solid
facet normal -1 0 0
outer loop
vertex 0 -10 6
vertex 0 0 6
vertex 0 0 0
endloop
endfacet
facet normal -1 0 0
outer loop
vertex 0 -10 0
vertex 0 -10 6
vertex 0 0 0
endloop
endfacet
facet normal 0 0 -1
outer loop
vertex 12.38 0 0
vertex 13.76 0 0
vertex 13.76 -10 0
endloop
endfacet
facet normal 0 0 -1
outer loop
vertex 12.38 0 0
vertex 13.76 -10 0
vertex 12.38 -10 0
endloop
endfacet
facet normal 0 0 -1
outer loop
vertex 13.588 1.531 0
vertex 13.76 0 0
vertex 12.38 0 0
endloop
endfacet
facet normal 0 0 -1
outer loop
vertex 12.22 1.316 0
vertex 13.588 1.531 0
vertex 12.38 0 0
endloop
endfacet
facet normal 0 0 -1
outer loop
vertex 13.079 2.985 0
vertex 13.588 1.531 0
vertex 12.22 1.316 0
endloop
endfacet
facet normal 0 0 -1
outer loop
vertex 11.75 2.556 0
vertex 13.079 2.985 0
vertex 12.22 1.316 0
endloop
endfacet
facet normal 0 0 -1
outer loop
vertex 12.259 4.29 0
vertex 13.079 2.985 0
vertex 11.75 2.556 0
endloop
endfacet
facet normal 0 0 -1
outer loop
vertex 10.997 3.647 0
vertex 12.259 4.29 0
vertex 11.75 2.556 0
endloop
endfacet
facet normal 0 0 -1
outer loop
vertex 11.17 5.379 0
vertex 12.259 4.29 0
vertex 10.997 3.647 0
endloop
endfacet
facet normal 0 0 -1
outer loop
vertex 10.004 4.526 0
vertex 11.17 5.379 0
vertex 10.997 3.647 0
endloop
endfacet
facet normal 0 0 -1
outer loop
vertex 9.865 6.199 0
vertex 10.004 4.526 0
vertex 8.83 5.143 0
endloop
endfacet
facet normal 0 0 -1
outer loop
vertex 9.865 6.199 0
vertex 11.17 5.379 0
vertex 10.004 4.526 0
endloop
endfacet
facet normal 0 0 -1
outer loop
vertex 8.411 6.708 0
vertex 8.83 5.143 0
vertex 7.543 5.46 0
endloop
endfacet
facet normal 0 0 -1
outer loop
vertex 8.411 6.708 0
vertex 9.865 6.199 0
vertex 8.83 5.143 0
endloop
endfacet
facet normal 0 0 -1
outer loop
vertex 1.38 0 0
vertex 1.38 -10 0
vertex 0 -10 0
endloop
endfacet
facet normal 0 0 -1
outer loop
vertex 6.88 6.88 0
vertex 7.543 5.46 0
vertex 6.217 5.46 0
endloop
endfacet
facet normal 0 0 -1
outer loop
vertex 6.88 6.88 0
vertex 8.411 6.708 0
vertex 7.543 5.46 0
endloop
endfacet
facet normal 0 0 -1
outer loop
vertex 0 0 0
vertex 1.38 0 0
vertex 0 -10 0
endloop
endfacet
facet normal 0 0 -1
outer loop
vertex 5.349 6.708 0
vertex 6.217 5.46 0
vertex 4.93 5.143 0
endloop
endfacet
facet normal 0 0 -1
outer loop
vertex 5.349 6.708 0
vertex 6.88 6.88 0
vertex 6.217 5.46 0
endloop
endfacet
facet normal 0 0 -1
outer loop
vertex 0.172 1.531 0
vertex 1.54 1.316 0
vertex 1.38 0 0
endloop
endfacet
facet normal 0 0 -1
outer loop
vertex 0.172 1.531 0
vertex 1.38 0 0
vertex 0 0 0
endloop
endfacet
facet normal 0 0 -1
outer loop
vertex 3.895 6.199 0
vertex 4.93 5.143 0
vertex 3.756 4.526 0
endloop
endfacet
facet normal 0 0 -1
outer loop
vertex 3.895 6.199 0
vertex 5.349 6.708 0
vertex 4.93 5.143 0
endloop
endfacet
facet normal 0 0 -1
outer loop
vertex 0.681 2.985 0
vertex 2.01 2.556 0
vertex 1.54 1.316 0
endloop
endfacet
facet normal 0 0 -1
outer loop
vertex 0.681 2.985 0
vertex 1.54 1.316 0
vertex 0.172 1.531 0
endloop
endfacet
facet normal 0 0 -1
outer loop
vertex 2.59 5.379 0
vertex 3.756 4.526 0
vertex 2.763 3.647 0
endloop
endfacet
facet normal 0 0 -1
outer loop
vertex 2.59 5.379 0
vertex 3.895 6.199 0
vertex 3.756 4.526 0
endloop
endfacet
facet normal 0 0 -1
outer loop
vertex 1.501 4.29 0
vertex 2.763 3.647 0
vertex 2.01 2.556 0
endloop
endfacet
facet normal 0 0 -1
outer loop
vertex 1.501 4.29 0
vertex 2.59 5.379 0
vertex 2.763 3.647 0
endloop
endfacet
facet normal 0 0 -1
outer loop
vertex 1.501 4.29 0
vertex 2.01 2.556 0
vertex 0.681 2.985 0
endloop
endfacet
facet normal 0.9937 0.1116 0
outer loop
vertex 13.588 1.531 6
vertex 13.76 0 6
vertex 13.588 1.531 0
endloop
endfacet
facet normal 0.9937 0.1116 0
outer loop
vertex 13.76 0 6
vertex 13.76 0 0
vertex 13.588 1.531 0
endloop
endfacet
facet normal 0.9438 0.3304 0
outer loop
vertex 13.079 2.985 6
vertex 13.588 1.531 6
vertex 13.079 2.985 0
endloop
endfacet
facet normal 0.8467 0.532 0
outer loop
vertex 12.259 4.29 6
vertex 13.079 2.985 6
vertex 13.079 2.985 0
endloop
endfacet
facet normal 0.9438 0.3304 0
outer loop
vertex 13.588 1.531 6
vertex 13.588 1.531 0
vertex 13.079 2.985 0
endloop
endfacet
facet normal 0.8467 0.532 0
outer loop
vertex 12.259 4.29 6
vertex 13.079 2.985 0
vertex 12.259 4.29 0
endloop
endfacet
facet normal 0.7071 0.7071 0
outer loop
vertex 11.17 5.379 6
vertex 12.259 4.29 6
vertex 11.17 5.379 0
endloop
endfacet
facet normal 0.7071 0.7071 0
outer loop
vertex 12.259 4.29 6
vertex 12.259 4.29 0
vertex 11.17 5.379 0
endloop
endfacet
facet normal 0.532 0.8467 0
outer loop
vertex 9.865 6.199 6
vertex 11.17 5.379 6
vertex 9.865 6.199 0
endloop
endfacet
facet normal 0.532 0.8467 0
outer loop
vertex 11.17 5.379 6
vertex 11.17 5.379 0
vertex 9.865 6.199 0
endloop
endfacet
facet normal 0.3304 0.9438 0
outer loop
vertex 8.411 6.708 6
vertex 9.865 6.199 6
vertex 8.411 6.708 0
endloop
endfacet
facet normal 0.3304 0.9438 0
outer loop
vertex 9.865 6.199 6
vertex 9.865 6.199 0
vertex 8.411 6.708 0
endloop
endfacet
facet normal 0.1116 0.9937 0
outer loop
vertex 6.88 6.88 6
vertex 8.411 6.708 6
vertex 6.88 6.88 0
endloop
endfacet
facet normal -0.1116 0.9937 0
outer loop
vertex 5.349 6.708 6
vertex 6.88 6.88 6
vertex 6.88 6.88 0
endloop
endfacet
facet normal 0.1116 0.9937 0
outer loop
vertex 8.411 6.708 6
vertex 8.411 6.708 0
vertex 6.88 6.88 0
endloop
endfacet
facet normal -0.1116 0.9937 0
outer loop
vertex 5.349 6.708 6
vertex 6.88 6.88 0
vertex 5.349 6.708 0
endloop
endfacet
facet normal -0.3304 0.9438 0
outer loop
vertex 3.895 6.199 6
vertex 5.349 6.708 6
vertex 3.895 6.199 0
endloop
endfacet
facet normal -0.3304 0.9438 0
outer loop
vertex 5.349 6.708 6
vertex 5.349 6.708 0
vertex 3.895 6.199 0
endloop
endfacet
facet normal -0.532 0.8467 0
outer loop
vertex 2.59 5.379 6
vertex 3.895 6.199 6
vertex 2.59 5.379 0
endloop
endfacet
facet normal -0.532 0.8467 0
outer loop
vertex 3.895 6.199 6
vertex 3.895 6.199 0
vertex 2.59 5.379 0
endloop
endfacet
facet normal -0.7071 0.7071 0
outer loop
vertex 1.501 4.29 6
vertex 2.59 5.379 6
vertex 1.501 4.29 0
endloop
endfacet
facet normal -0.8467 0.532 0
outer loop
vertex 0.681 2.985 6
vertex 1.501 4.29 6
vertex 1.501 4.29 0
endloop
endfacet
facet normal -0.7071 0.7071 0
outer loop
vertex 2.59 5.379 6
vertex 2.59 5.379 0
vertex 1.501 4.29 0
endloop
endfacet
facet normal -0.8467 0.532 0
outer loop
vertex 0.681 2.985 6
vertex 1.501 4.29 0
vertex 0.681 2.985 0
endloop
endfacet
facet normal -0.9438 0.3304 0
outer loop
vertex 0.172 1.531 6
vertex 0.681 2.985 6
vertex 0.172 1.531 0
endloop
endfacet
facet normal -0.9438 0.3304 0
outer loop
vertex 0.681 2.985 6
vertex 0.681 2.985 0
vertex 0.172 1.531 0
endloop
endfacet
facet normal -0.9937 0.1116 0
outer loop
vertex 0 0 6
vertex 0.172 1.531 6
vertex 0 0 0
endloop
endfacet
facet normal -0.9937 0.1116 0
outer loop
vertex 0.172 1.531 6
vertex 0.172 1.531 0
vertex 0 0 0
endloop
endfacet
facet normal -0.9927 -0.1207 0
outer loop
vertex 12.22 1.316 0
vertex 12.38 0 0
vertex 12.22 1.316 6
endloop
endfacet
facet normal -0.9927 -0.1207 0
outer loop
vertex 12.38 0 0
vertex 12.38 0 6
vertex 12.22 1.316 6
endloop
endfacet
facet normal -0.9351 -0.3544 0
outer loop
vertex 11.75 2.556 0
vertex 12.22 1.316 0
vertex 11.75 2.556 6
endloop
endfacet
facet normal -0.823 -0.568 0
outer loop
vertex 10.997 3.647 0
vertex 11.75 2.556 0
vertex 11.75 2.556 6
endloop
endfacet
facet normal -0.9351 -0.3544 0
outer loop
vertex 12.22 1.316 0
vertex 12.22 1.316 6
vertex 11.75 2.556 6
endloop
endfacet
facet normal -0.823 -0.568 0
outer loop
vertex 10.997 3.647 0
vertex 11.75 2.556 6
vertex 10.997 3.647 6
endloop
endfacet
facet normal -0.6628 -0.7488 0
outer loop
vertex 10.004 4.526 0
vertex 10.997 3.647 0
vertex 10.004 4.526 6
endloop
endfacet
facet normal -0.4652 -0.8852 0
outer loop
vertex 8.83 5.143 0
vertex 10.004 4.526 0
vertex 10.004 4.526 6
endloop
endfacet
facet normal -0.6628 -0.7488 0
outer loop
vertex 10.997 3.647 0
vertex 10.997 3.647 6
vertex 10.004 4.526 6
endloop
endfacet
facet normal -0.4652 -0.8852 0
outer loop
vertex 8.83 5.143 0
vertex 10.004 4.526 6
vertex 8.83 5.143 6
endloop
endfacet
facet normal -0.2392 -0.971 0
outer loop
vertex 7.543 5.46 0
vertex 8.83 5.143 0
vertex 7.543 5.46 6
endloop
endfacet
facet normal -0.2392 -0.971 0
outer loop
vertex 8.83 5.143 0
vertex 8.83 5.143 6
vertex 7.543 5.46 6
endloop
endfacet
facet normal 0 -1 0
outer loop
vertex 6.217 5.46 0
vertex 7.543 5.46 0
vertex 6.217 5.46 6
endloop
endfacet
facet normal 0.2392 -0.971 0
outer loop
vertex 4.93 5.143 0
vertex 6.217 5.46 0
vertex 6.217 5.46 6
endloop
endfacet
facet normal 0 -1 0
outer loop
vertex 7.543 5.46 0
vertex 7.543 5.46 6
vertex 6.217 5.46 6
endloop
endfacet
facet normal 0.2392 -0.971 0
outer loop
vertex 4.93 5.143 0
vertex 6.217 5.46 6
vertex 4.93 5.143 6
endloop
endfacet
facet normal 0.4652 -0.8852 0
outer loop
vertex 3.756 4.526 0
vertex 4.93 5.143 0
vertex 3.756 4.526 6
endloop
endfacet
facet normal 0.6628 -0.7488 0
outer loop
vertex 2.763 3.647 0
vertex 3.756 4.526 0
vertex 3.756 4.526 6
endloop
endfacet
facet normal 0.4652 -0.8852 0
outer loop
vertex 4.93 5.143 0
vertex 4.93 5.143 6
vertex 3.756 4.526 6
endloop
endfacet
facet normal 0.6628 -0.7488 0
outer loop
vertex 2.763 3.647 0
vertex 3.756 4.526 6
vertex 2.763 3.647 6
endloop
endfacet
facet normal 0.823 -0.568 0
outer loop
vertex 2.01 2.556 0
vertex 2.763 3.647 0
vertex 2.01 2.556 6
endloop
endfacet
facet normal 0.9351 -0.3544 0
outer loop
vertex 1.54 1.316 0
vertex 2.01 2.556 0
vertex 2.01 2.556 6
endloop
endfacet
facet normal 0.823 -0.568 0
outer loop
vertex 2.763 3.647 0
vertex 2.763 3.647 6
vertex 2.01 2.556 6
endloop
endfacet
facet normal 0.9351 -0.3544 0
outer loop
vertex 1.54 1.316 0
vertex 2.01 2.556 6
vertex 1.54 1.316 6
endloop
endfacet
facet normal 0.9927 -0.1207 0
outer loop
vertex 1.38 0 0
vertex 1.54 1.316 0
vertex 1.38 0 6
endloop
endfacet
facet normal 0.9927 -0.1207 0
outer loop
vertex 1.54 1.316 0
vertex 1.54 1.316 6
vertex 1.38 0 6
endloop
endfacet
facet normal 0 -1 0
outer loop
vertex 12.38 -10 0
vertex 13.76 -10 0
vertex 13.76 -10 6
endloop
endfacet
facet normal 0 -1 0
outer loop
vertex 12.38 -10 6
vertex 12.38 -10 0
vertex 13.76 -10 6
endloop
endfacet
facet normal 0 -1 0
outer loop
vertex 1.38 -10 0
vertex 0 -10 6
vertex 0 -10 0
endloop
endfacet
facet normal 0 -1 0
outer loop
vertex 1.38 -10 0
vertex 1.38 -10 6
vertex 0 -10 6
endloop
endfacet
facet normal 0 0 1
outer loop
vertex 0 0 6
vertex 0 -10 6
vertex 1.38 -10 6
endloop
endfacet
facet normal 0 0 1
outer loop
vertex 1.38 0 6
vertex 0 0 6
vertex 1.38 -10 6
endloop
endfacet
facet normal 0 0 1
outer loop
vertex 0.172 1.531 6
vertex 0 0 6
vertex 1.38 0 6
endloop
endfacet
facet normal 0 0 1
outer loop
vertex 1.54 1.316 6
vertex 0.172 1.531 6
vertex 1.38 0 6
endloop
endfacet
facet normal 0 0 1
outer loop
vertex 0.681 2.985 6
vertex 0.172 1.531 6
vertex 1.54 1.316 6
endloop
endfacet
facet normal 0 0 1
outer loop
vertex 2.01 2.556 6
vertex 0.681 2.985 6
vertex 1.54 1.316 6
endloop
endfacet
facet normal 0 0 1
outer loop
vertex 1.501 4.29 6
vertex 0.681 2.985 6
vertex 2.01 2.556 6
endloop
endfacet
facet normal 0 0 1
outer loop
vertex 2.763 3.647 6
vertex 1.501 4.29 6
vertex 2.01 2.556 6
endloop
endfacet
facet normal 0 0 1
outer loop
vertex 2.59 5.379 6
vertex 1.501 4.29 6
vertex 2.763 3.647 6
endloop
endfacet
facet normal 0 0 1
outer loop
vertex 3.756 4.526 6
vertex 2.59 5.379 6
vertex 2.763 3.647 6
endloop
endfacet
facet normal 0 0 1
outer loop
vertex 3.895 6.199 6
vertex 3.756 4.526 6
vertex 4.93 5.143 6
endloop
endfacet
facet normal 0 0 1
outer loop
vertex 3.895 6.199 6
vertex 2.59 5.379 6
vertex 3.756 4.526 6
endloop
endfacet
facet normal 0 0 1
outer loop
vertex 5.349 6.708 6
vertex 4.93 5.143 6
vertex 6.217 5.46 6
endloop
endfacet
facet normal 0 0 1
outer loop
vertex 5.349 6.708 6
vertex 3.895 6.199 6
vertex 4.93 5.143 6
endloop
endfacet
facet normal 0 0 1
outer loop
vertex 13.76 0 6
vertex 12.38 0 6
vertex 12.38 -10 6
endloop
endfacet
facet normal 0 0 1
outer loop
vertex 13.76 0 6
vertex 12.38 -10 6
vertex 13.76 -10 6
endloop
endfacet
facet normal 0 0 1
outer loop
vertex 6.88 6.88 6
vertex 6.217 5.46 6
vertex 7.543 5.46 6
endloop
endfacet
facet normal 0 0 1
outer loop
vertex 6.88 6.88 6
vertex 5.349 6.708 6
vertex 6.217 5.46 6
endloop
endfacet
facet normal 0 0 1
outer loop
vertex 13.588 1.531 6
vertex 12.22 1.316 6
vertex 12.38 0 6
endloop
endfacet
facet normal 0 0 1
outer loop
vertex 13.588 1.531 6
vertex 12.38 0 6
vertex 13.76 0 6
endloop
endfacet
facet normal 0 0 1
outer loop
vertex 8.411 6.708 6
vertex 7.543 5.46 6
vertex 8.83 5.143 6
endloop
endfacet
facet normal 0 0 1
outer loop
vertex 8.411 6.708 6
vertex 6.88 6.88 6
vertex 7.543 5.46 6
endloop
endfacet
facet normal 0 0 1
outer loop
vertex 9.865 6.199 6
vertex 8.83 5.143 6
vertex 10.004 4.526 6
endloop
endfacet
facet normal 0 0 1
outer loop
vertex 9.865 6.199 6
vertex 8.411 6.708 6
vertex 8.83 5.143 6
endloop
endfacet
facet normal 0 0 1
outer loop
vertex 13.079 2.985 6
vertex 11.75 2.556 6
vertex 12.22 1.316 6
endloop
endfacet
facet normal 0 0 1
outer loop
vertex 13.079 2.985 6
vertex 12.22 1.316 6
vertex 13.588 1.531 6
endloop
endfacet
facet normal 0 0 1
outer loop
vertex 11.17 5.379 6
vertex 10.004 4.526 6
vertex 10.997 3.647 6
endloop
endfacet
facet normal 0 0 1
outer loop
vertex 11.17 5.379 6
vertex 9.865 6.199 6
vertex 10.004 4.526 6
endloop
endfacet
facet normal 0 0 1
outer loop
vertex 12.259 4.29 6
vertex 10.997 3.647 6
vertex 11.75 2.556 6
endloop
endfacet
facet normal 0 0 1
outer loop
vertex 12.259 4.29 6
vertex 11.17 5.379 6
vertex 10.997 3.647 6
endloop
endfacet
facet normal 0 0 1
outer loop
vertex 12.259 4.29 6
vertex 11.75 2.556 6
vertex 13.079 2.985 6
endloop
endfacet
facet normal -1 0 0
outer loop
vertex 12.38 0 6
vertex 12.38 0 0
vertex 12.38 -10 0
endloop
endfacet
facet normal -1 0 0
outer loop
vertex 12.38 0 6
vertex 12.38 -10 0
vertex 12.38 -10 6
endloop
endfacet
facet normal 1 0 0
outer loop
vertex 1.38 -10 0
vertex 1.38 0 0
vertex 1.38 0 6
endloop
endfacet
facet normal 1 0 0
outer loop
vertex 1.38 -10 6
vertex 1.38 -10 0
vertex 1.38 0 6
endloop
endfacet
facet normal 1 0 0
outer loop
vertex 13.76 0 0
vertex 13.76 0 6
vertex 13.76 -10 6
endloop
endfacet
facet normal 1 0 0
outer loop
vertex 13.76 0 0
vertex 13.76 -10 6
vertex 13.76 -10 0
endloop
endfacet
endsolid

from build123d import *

# Parameters (mm, degrees)
SKETCH013_W = 1.38
SKETCH013_H = 6


with BuildPart() as part:
    # AdditivePipe004: sweep along a path in Sketch014
    with BuildLine(Plane.XY) as additivepipe004_path:
        Line((12.38, -10), (12.38, 0))
        ThreePointArc((12.38, 0), (6.88, 5.5), (1.38, 0))
        Line((1.38, 0), (1.38, -10))
    # Sketch013 → AdditivePipe004 (sweep)
    with BuildSketch(Plane.XZ):
        with Locations((0.69, 3)):
            Rectangle(SKETCH013_W, SKETCH013_H)
    sweep(path=additivepipe004_path.line)


solid = part.part
